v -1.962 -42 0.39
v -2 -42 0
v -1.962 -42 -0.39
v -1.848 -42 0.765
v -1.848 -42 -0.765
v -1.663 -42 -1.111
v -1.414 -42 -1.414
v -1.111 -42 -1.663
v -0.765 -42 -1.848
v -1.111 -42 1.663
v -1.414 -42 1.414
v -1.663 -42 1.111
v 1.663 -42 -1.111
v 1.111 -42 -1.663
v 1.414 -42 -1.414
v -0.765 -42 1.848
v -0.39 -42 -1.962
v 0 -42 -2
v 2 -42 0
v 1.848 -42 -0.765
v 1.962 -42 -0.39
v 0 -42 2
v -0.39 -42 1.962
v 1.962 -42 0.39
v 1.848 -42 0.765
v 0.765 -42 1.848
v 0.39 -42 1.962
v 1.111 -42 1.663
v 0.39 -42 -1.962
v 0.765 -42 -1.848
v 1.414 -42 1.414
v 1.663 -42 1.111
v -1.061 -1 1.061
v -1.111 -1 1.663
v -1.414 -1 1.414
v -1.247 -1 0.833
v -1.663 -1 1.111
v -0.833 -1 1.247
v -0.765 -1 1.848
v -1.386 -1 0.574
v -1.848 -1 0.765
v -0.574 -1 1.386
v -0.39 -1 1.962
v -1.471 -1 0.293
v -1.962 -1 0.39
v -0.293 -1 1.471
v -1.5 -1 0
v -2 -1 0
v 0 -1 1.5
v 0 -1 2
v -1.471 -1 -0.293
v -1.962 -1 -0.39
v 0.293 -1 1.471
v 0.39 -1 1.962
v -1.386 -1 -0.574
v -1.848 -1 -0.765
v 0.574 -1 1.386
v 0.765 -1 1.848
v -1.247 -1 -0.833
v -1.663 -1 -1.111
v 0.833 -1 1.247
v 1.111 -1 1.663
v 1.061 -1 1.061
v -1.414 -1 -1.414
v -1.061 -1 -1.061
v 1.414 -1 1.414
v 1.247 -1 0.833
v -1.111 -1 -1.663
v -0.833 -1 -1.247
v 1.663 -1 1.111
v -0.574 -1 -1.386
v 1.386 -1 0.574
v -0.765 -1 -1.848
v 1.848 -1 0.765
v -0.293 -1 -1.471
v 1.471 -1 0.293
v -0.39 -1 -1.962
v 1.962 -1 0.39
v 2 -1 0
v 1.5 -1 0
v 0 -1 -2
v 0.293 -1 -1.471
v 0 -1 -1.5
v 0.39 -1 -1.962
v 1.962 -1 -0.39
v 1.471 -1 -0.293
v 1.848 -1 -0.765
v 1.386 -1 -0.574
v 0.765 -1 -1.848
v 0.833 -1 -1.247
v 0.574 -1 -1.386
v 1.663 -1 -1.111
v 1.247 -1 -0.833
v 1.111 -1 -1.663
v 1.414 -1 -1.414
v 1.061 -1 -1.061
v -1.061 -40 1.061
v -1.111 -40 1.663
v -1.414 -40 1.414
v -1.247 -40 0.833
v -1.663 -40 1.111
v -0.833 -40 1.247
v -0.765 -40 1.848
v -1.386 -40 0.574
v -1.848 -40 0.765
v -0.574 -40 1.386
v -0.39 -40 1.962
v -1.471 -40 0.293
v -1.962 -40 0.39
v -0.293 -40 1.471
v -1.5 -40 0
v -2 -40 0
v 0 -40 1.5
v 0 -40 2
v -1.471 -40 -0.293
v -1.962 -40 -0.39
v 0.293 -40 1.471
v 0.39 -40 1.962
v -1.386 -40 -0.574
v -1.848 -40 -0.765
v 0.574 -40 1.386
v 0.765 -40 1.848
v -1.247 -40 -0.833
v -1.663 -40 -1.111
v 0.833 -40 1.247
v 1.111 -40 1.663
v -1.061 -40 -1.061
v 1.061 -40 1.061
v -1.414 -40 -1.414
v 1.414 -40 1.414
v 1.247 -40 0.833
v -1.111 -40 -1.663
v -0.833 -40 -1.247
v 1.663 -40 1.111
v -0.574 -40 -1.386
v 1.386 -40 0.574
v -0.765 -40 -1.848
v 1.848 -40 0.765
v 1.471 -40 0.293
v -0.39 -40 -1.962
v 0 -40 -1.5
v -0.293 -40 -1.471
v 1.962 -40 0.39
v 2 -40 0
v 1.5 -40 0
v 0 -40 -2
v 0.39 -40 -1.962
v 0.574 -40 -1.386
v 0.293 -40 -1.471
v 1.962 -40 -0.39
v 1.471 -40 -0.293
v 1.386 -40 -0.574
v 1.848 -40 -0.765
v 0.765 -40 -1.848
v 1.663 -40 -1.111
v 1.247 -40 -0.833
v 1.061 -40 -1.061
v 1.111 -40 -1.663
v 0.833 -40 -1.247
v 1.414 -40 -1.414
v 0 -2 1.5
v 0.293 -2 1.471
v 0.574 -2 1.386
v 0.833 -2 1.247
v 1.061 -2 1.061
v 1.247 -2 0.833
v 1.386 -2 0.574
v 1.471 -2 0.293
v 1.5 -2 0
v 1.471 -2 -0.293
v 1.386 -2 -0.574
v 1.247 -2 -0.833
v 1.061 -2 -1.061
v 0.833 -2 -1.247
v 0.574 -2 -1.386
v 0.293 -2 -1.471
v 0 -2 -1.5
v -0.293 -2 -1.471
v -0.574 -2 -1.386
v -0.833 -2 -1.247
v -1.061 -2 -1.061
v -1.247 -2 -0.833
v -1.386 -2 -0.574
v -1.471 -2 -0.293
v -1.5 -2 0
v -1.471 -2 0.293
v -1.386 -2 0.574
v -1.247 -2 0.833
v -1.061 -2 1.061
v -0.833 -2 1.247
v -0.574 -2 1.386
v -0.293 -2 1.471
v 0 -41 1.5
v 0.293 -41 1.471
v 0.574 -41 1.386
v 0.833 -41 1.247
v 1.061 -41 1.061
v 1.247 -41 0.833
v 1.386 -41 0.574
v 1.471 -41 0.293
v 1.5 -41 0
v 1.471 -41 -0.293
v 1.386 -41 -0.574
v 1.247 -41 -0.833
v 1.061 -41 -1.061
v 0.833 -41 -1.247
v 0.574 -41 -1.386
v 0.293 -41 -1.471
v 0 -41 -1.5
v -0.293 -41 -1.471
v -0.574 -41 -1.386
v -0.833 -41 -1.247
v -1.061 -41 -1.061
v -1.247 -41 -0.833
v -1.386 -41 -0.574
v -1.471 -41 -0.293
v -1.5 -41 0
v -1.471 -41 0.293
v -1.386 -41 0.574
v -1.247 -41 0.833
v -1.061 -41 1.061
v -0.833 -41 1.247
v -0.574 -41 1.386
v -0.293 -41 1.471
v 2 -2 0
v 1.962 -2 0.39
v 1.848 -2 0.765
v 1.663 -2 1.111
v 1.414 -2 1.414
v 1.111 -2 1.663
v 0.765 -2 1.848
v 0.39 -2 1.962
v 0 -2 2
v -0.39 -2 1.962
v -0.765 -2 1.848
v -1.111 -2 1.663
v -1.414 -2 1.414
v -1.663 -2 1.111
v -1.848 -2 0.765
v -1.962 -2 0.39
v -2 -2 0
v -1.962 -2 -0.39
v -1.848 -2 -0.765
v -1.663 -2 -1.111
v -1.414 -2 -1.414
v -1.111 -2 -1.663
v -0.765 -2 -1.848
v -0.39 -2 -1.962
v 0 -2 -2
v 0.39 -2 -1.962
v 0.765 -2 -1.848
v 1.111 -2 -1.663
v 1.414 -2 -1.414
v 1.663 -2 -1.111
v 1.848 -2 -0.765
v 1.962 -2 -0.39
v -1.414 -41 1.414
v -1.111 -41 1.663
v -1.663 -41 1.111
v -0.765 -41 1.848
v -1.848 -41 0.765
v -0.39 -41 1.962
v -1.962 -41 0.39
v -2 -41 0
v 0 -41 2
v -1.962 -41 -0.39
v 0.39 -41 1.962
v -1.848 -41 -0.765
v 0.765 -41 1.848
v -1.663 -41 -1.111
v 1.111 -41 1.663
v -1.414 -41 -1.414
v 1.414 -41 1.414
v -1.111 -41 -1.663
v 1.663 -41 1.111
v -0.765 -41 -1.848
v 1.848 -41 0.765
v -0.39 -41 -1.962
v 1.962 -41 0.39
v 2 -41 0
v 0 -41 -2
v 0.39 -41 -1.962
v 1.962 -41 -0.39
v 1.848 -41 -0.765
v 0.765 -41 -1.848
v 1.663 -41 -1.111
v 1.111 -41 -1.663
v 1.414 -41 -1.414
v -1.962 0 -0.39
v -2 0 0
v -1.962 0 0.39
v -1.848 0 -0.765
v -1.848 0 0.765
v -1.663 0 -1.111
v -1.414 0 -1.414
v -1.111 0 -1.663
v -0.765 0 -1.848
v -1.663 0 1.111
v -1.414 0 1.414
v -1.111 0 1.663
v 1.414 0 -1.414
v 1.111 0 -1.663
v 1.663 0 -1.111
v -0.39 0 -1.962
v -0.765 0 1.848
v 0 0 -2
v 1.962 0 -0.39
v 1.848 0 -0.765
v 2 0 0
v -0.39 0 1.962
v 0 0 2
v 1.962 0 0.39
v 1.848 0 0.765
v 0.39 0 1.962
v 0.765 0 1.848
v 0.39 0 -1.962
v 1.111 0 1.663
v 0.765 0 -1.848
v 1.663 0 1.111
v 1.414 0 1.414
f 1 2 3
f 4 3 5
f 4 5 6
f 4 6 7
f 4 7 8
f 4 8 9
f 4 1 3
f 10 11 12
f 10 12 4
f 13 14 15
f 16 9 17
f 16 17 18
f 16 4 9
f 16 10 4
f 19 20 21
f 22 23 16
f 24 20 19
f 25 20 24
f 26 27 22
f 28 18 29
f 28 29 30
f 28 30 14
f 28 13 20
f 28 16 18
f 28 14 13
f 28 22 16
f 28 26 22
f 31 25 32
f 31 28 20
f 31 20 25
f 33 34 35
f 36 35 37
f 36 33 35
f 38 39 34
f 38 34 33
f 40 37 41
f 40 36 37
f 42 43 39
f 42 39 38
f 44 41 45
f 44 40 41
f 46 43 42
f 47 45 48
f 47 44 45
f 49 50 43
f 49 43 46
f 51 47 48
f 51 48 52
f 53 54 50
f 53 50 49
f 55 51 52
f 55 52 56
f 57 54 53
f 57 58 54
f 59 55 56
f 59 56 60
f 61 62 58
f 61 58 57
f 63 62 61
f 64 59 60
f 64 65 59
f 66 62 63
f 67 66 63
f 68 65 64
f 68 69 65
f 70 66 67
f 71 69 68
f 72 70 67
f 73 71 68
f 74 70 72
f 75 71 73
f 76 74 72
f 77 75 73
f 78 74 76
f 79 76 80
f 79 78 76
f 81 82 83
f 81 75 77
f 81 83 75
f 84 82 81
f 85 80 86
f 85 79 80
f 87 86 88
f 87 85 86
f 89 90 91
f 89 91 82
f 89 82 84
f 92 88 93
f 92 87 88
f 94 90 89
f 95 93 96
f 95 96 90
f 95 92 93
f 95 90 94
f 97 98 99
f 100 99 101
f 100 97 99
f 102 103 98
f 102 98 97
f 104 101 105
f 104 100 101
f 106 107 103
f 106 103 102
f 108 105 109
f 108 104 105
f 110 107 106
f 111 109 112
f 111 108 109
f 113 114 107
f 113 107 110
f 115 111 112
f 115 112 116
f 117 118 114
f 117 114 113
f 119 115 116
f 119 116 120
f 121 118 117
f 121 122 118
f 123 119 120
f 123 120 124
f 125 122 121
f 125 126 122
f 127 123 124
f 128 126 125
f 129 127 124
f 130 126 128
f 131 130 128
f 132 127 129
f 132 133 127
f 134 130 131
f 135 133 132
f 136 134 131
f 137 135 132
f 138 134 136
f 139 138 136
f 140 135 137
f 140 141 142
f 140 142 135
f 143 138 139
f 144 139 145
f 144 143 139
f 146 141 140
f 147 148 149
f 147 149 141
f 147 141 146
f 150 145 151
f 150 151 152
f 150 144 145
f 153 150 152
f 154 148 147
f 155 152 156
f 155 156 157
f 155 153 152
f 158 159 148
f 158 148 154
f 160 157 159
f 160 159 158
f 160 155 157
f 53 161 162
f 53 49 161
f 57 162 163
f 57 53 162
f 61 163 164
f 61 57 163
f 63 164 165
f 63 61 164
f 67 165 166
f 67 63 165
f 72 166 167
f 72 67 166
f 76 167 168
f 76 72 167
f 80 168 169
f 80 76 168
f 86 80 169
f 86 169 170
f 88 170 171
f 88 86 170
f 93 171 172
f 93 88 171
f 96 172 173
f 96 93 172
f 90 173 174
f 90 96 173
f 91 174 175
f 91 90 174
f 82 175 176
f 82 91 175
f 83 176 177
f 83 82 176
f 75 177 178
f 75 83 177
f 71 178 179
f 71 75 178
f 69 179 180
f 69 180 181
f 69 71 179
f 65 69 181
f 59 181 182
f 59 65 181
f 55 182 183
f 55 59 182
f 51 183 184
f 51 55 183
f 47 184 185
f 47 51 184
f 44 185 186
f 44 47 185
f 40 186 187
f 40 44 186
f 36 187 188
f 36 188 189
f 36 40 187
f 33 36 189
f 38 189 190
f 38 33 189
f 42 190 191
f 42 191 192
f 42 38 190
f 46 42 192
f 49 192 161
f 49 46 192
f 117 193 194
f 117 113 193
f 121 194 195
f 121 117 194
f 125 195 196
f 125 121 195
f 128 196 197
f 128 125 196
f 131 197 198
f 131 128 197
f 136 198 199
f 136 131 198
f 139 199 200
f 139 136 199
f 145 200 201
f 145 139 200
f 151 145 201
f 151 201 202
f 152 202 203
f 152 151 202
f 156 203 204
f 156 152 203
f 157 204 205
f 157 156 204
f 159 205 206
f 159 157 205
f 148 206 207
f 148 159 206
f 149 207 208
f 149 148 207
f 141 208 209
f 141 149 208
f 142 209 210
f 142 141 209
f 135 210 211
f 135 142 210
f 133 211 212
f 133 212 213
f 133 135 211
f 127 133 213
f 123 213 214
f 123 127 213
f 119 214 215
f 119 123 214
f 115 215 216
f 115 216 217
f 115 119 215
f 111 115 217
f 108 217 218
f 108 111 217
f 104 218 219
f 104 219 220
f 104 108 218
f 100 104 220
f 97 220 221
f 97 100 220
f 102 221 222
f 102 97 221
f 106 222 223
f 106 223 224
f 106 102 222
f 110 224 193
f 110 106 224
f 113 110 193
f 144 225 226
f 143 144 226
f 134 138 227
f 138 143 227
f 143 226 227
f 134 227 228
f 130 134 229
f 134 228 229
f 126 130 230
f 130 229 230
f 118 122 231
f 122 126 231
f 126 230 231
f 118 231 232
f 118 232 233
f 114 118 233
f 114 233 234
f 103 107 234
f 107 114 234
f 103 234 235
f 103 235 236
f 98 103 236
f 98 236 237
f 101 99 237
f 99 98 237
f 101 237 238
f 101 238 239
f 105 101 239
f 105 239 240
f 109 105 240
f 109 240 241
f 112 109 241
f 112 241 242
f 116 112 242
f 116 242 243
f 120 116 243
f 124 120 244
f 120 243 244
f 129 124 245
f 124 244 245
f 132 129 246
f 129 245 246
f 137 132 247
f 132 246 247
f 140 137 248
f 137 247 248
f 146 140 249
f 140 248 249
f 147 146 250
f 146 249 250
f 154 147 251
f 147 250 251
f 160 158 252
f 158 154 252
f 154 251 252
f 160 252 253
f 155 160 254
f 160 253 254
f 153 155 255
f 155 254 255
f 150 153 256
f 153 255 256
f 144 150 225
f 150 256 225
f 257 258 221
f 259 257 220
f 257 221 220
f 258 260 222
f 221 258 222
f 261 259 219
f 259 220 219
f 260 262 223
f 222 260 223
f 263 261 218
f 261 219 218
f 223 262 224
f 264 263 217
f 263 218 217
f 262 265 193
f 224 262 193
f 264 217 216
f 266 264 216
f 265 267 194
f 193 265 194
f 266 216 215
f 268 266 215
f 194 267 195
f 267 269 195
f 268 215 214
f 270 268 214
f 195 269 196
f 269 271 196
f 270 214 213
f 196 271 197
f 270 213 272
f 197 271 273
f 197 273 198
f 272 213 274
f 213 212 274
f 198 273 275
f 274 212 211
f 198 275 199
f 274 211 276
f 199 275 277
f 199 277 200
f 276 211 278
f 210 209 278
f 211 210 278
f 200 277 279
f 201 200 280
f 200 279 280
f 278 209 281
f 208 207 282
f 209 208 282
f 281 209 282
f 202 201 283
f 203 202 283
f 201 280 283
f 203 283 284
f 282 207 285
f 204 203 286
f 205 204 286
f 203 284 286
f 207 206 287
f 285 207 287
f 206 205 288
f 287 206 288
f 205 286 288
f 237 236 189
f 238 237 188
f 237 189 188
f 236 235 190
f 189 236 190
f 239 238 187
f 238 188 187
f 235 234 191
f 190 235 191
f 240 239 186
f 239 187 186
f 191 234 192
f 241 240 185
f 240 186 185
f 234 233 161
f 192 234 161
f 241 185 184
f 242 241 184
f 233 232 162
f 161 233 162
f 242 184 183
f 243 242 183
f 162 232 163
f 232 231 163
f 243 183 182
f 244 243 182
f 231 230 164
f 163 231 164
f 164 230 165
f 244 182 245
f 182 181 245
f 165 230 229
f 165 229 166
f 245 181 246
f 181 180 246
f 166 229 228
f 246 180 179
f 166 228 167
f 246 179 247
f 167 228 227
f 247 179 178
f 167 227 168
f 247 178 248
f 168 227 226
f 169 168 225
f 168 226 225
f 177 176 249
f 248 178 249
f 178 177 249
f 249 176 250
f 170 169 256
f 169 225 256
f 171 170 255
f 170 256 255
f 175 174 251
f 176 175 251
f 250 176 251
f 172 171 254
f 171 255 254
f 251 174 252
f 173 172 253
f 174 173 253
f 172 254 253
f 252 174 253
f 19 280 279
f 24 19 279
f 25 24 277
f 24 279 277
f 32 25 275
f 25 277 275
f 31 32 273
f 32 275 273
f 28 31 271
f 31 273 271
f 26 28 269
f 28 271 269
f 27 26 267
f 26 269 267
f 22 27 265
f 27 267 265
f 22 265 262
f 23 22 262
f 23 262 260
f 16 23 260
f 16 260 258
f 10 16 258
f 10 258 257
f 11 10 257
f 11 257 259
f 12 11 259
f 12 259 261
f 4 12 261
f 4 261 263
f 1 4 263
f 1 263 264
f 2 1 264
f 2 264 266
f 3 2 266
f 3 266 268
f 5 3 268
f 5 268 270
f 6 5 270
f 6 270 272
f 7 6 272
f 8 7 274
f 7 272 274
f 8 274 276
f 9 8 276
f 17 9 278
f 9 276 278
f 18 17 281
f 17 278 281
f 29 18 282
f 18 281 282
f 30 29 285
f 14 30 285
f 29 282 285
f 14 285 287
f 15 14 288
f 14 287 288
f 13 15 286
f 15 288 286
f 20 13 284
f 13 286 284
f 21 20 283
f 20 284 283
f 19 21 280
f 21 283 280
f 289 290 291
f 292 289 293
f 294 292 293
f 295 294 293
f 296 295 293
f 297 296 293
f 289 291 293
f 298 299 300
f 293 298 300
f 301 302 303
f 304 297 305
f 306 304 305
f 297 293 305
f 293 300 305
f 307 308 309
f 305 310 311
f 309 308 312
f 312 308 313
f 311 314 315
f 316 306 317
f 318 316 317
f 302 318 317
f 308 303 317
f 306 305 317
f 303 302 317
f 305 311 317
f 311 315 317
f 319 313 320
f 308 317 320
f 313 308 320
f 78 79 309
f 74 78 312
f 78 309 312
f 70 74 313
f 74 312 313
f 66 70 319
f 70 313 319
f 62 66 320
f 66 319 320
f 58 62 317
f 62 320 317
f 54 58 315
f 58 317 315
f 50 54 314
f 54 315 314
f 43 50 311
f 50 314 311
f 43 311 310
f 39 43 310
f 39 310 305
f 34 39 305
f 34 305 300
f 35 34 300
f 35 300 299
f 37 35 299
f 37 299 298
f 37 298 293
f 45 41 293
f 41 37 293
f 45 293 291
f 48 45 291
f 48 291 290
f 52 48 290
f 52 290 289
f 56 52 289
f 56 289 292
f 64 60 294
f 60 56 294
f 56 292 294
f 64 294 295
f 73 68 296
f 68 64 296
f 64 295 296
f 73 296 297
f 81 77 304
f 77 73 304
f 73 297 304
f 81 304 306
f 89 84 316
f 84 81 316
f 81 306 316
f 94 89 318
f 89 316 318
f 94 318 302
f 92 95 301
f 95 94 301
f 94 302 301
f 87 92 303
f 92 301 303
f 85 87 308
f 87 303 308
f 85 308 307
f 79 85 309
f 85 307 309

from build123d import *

# Parameters (mm, degrees)
F0_R     = 2
F1_DEPTH = 42
F2_W     = 1
F2_H     = 4.527544
F2_H_2   = 5.616845


with BuildPart() as f1:
    # F0 (on Front) → F1 (new body)
    with BuildSketch(Plane.XZ):
        Circle(F0_R)
    extrude(amount=F1_DEPTH)

    # F2 (on Right) → F3 (revolve, cut)
    with BuildSketch(Plane.YZ):
        with Locations((-40.5, 3.763772)):
            Rectangle(F2_W, F2_H)
        with Locations((-1.5, 4.308422)):
            Rectangle(F2_W, F2_H_2)
    revolve(axis=Axis((0, 0, 0), (0, 1, 0)), mode=Mode.SUBTRACT)


solid = f1.part
